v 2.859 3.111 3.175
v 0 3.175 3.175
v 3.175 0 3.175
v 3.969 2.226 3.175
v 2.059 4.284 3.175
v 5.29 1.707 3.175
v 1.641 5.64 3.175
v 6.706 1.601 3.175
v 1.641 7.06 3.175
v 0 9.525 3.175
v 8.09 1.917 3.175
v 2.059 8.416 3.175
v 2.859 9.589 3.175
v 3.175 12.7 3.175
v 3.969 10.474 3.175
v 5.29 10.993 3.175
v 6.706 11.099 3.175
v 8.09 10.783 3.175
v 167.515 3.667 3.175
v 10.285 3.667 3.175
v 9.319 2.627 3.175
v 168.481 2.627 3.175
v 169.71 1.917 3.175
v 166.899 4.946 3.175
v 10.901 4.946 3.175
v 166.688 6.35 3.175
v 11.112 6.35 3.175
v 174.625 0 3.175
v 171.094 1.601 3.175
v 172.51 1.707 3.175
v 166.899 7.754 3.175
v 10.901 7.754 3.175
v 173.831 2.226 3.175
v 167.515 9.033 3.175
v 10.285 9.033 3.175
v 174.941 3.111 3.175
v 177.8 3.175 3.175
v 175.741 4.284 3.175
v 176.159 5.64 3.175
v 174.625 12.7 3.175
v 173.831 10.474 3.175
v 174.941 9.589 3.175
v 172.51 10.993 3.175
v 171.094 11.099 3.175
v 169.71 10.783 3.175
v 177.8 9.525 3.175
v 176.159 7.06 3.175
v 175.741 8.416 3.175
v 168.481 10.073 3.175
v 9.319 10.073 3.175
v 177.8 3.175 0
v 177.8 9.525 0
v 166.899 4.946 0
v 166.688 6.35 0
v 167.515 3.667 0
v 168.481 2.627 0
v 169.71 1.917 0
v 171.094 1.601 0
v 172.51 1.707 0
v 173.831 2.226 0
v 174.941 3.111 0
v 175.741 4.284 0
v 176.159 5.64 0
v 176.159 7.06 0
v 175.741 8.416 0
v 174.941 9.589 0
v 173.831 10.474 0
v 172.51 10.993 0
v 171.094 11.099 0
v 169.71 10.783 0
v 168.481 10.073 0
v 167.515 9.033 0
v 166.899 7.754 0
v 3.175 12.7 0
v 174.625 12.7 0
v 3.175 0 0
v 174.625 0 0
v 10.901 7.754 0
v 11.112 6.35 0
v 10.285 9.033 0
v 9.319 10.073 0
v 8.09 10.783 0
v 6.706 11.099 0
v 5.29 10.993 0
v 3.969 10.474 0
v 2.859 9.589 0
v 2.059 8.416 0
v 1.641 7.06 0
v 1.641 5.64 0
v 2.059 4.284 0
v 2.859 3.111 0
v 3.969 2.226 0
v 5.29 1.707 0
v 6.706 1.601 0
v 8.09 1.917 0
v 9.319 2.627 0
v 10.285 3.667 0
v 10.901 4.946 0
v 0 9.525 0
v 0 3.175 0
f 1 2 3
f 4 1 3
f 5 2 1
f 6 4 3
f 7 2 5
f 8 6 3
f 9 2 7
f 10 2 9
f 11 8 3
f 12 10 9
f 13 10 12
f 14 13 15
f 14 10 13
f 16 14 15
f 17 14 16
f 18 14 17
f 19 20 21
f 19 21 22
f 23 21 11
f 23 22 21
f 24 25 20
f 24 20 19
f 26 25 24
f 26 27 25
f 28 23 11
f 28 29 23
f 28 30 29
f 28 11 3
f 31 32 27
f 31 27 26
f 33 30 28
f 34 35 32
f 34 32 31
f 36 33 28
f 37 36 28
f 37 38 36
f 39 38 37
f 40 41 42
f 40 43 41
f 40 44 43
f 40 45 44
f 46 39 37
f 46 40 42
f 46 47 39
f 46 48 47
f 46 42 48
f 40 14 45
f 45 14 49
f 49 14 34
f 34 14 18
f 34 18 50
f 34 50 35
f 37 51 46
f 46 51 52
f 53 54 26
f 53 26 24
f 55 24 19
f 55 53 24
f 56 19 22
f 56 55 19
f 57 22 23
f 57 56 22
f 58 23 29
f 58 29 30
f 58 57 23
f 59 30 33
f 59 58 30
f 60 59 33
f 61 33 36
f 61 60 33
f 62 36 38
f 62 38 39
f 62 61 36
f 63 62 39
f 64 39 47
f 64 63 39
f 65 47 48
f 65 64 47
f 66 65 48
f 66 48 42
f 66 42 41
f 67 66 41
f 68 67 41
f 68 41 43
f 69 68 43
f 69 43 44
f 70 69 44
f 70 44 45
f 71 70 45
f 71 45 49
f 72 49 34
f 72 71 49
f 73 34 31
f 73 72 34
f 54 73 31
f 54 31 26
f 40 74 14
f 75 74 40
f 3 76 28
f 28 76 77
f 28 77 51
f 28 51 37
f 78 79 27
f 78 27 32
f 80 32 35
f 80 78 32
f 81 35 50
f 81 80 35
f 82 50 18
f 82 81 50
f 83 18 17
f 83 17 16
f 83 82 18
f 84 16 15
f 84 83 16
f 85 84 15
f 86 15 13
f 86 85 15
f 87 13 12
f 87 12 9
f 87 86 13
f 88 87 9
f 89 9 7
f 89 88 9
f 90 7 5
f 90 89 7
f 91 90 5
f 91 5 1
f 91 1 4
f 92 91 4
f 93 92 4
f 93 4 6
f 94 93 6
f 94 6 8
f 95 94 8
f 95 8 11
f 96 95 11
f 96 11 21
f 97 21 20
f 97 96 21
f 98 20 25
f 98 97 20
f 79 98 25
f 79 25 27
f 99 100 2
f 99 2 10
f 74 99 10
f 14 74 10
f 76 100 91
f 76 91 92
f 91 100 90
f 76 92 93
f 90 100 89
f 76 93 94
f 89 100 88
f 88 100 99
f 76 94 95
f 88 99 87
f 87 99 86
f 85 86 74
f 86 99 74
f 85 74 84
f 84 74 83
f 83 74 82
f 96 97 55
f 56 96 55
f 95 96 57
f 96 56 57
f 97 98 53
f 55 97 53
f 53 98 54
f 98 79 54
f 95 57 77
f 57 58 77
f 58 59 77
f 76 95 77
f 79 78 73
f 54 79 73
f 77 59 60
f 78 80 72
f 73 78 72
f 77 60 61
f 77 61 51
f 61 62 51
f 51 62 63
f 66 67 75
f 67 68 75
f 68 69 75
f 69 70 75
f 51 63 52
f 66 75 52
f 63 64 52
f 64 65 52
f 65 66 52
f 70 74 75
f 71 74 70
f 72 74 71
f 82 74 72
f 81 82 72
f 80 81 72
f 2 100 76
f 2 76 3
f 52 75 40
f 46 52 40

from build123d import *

# Parameters (mm, degrees)
SKETCH1_W          = 177.8
SKETCH1_H          = 12.7
SKETCH1_R          = 4.7625
BASE_EXTRUDE_DEPTH = 3.175
CHAMFER1_SIZE      = 3.175


with BuildPart() as part:
    # Sketch1 → Base-Extrude (new body)
    with BuildSketch(Plane.XY):
        with Locations((88.9, 6.35)):
            Rectangle(SKETCH1_W, SKETCH1_H)
        with Locations((6.35, 6.35)):
            Circle(SKETCH1_R, mode=Mode.SUBTRACT)
        with Locations(Location((171.45, 6.35, 0), (0, 0, 180))):
            Circle(SKETCH1_R, mode=Mode.SUBTRACT)
    extrude(amount=BASE_EXTRUDE_DEPTH)

    # Chamfer1
    chamfer1_edges = [part.edges().sort_by_distance(p)[0] for p in [
        (0, 12.7, 1.5875),
        (177.8, 12.7, 1.5875),
        (177.8, 0, 1.5875),
        (0, 0, 1.5875),
    ]]
    chamfer(chamfer1_edges, length=CHAMFER1_SIZE)


solid = part.part
